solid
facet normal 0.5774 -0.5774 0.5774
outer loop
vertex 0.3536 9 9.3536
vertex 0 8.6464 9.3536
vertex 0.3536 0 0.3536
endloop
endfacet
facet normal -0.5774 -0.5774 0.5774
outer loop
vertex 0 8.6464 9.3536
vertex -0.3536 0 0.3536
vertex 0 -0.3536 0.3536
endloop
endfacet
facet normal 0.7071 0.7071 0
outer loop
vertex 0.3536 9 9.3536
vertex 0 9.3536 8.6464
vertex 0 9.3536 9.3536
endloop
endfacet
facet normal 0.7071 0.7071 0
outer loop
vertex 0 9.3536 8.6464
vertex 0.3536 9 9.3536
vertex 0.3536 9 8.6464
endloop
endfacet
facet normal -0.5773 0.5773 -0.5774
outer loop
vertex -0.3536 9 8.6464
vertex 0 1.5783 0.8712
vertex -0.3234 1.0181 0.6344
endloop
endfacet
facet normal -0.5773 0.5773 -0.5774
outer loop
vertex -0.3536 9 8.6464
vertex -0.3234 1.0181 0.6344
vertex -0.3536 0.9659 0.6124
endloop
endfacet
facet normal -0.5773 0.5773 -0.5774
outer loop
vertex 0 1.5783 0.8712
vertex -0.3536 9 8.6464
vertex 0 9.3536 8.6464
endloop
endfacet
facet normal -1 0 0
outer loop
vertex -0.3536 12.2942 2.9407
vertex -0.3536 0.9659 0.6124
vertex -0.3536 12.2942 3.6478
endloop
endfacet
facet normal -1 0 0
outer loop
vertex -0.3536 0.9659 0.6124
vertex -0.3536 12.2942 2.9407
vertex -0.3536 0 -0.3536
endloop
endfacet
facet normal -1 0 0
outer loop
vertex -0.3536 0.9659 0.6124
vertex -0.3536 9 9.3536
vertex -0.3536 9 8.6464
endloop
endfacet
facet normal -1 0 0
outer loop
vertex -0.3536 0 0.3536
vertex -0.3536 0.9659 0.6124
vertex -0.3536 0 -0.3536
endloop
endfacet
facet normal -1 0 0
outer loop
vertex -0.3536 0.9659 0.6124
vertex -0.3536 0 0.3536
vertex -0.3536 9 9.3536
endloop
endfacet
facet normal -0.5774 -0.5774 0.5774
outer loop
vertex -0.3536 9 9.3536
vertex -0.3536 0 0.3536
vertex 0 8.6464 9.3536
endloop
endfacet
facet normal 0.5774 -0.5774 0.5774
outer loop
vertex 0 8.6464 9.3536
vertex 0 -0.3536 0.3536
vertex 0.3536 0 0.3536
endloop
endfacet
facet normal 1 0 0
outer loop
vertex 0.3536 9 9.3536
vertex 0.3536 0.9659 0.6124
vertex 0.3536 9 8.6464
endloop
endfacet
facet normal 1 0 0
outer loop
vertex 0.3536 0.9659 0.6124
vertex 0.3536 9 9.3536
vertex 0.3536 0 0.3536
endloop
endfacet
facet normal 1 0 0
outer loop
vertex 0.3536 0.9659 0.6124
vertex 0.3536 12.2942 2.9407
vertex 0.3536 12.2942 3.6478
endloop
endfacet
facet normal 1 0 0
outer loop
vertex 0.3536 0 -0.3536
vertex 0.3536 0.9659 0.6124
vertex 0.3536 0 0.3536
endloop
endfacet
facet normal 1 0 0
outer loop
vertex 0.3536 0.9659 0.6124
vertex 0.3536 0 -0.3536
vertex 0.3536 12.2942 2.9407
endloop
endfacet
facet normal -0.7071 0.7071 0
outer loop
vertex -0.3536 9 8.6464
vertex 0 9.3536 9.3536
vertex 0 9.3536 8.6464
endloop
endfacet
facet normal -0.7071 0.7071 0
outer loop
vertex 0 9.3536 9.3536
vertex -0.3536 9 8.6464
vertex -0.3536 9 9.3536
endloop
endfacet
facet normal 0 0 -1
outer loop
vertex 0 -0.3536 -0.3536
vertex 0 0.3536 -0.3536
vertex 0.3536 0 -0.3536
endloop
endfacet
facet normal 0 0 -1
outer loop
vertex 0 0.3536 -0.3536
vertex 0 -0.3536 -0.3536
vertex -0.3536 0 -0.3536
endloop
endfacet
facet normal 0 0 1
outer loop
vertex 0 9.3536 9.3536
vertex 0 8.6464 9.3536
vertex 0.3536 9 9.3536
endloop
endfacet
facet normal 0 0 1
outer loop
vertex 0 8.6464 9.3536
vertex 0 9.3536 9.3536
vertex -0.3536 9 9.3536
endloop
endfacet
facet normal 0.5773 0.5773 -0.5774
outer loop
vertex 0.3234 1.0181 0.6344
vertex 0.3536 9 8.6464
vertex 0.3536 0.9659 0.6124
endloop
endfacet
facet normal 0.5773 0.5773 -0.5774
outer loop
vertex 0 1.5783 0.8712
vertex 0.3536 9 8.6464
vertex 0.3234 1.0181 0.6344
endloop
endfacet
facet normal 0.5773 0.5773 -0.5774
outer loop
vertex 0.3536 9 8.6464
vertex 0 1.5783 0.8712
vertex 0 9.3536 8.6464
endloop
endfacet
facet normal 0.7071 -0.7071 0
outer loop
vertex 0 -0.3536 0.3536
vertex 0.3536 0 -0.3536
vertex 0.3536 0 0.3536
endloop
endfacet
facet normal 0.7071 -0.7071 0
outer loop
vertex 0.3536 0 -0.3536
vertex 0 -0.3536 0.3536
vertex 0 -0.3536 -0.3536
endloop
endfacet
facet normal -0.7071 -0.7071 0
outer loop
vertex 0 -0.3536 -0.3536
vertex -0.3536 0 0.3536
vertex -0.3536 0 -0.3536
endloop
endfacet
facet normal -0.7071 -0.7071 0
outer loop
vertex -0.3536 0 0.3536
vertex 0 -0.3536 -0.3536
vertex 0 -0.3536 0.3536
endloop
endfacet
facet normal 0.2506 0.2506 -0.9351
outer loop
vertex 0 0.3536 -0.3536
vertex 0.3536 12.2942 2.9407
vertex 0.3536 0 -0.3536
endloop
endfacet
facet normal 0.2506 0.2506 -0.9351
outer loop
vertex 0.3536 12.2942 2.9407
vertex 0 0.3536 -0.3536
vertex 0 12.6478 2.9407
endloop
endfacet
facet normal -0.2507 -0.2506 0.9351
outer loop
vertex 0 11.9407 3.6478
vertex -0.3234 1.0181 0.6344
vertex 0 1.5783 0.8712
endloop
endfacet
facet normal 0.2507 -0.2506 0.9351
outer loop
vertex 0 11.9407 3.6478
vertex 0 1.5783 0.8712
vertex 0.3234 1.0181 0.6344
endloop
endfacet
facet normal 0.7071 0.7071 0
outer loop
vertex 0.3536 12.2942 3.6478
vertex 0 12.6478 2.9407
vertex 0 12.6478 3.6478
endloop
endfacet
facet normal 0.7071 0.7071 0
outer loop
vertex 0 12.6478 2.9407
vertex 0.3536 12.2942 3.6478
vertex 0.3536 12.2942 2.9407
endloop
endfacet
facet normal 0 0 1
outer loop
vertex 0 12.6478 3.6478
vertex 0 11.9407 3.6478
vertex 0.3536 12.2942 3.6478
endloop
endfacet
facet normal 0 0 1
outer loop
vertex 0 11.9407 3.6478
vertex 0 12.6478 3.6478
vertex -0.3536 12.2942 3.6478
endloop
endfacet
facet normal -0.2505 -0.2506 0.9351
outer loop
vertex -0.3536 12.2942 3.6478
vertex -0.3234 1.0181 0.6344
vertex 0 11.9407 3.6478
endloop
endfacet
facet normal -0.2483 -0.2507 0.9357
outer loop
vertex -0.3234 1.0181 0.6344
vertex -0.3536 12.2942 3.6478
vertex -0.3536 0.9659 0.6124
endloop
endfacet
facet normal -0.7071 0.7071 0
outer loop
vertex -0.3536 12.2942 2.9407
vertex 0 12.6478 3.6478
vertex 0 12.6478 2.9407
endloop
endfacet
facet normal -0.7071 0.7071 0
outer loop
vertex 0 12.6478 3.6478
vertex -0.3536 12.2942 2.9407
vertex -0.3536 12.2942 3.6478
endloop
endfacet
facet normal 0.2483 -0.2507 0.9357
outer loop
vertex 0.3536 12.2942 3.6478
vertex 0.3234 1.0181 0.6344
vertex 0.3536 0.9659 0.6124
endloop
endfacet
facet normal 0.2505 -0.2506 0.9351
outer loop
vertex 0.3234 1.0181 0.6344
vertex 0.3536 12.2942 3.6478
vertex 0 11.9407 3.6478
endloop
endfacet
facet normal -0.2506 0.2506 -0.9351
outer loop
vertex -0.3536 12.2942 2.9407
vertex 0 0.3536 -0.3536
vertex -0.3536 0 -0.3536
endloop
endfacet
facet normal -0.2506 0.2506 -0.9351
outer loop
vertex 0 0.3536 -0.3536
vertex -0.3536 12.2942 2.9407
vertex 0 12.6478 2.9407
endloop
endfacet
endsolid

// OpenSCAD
module draw_line(p1,p2,thickness,fn=4){
    $fn=fn;
    
    hull(){
        translate(p1)sphere(thickness/2);
        translate(p2)sphere(thickness/2);
        } 
    }


module polyline_3D(points,thickness,fn=4){
    module polyline3D_inner(points,index){
         if (index<len(points)){
             draw_line(points[index-1],points[index],thickness,fn);
             polyline3D_inner(points,index+1);
         }  
    }
    polyline3D_inner(points,1);
}


//---------------------------------------------
function rotate_x(vt,angle)=
     let(
     r=
     [
     [1,0,0],
     [0,cos(angle),sin(angle)],
     [0,-sin(angle),cos(angle)]
     ]*
     [vt.x,vt.y,vt.z]
)
  [r.x,r.y,r.z];




points=[[0,0,0],[0,9,9]];
polyline_3D(points,1,4);


test_points=[[0,0,0],rotate_x([0,9,9],30)];
polyline_3D(test_points,1,4);
